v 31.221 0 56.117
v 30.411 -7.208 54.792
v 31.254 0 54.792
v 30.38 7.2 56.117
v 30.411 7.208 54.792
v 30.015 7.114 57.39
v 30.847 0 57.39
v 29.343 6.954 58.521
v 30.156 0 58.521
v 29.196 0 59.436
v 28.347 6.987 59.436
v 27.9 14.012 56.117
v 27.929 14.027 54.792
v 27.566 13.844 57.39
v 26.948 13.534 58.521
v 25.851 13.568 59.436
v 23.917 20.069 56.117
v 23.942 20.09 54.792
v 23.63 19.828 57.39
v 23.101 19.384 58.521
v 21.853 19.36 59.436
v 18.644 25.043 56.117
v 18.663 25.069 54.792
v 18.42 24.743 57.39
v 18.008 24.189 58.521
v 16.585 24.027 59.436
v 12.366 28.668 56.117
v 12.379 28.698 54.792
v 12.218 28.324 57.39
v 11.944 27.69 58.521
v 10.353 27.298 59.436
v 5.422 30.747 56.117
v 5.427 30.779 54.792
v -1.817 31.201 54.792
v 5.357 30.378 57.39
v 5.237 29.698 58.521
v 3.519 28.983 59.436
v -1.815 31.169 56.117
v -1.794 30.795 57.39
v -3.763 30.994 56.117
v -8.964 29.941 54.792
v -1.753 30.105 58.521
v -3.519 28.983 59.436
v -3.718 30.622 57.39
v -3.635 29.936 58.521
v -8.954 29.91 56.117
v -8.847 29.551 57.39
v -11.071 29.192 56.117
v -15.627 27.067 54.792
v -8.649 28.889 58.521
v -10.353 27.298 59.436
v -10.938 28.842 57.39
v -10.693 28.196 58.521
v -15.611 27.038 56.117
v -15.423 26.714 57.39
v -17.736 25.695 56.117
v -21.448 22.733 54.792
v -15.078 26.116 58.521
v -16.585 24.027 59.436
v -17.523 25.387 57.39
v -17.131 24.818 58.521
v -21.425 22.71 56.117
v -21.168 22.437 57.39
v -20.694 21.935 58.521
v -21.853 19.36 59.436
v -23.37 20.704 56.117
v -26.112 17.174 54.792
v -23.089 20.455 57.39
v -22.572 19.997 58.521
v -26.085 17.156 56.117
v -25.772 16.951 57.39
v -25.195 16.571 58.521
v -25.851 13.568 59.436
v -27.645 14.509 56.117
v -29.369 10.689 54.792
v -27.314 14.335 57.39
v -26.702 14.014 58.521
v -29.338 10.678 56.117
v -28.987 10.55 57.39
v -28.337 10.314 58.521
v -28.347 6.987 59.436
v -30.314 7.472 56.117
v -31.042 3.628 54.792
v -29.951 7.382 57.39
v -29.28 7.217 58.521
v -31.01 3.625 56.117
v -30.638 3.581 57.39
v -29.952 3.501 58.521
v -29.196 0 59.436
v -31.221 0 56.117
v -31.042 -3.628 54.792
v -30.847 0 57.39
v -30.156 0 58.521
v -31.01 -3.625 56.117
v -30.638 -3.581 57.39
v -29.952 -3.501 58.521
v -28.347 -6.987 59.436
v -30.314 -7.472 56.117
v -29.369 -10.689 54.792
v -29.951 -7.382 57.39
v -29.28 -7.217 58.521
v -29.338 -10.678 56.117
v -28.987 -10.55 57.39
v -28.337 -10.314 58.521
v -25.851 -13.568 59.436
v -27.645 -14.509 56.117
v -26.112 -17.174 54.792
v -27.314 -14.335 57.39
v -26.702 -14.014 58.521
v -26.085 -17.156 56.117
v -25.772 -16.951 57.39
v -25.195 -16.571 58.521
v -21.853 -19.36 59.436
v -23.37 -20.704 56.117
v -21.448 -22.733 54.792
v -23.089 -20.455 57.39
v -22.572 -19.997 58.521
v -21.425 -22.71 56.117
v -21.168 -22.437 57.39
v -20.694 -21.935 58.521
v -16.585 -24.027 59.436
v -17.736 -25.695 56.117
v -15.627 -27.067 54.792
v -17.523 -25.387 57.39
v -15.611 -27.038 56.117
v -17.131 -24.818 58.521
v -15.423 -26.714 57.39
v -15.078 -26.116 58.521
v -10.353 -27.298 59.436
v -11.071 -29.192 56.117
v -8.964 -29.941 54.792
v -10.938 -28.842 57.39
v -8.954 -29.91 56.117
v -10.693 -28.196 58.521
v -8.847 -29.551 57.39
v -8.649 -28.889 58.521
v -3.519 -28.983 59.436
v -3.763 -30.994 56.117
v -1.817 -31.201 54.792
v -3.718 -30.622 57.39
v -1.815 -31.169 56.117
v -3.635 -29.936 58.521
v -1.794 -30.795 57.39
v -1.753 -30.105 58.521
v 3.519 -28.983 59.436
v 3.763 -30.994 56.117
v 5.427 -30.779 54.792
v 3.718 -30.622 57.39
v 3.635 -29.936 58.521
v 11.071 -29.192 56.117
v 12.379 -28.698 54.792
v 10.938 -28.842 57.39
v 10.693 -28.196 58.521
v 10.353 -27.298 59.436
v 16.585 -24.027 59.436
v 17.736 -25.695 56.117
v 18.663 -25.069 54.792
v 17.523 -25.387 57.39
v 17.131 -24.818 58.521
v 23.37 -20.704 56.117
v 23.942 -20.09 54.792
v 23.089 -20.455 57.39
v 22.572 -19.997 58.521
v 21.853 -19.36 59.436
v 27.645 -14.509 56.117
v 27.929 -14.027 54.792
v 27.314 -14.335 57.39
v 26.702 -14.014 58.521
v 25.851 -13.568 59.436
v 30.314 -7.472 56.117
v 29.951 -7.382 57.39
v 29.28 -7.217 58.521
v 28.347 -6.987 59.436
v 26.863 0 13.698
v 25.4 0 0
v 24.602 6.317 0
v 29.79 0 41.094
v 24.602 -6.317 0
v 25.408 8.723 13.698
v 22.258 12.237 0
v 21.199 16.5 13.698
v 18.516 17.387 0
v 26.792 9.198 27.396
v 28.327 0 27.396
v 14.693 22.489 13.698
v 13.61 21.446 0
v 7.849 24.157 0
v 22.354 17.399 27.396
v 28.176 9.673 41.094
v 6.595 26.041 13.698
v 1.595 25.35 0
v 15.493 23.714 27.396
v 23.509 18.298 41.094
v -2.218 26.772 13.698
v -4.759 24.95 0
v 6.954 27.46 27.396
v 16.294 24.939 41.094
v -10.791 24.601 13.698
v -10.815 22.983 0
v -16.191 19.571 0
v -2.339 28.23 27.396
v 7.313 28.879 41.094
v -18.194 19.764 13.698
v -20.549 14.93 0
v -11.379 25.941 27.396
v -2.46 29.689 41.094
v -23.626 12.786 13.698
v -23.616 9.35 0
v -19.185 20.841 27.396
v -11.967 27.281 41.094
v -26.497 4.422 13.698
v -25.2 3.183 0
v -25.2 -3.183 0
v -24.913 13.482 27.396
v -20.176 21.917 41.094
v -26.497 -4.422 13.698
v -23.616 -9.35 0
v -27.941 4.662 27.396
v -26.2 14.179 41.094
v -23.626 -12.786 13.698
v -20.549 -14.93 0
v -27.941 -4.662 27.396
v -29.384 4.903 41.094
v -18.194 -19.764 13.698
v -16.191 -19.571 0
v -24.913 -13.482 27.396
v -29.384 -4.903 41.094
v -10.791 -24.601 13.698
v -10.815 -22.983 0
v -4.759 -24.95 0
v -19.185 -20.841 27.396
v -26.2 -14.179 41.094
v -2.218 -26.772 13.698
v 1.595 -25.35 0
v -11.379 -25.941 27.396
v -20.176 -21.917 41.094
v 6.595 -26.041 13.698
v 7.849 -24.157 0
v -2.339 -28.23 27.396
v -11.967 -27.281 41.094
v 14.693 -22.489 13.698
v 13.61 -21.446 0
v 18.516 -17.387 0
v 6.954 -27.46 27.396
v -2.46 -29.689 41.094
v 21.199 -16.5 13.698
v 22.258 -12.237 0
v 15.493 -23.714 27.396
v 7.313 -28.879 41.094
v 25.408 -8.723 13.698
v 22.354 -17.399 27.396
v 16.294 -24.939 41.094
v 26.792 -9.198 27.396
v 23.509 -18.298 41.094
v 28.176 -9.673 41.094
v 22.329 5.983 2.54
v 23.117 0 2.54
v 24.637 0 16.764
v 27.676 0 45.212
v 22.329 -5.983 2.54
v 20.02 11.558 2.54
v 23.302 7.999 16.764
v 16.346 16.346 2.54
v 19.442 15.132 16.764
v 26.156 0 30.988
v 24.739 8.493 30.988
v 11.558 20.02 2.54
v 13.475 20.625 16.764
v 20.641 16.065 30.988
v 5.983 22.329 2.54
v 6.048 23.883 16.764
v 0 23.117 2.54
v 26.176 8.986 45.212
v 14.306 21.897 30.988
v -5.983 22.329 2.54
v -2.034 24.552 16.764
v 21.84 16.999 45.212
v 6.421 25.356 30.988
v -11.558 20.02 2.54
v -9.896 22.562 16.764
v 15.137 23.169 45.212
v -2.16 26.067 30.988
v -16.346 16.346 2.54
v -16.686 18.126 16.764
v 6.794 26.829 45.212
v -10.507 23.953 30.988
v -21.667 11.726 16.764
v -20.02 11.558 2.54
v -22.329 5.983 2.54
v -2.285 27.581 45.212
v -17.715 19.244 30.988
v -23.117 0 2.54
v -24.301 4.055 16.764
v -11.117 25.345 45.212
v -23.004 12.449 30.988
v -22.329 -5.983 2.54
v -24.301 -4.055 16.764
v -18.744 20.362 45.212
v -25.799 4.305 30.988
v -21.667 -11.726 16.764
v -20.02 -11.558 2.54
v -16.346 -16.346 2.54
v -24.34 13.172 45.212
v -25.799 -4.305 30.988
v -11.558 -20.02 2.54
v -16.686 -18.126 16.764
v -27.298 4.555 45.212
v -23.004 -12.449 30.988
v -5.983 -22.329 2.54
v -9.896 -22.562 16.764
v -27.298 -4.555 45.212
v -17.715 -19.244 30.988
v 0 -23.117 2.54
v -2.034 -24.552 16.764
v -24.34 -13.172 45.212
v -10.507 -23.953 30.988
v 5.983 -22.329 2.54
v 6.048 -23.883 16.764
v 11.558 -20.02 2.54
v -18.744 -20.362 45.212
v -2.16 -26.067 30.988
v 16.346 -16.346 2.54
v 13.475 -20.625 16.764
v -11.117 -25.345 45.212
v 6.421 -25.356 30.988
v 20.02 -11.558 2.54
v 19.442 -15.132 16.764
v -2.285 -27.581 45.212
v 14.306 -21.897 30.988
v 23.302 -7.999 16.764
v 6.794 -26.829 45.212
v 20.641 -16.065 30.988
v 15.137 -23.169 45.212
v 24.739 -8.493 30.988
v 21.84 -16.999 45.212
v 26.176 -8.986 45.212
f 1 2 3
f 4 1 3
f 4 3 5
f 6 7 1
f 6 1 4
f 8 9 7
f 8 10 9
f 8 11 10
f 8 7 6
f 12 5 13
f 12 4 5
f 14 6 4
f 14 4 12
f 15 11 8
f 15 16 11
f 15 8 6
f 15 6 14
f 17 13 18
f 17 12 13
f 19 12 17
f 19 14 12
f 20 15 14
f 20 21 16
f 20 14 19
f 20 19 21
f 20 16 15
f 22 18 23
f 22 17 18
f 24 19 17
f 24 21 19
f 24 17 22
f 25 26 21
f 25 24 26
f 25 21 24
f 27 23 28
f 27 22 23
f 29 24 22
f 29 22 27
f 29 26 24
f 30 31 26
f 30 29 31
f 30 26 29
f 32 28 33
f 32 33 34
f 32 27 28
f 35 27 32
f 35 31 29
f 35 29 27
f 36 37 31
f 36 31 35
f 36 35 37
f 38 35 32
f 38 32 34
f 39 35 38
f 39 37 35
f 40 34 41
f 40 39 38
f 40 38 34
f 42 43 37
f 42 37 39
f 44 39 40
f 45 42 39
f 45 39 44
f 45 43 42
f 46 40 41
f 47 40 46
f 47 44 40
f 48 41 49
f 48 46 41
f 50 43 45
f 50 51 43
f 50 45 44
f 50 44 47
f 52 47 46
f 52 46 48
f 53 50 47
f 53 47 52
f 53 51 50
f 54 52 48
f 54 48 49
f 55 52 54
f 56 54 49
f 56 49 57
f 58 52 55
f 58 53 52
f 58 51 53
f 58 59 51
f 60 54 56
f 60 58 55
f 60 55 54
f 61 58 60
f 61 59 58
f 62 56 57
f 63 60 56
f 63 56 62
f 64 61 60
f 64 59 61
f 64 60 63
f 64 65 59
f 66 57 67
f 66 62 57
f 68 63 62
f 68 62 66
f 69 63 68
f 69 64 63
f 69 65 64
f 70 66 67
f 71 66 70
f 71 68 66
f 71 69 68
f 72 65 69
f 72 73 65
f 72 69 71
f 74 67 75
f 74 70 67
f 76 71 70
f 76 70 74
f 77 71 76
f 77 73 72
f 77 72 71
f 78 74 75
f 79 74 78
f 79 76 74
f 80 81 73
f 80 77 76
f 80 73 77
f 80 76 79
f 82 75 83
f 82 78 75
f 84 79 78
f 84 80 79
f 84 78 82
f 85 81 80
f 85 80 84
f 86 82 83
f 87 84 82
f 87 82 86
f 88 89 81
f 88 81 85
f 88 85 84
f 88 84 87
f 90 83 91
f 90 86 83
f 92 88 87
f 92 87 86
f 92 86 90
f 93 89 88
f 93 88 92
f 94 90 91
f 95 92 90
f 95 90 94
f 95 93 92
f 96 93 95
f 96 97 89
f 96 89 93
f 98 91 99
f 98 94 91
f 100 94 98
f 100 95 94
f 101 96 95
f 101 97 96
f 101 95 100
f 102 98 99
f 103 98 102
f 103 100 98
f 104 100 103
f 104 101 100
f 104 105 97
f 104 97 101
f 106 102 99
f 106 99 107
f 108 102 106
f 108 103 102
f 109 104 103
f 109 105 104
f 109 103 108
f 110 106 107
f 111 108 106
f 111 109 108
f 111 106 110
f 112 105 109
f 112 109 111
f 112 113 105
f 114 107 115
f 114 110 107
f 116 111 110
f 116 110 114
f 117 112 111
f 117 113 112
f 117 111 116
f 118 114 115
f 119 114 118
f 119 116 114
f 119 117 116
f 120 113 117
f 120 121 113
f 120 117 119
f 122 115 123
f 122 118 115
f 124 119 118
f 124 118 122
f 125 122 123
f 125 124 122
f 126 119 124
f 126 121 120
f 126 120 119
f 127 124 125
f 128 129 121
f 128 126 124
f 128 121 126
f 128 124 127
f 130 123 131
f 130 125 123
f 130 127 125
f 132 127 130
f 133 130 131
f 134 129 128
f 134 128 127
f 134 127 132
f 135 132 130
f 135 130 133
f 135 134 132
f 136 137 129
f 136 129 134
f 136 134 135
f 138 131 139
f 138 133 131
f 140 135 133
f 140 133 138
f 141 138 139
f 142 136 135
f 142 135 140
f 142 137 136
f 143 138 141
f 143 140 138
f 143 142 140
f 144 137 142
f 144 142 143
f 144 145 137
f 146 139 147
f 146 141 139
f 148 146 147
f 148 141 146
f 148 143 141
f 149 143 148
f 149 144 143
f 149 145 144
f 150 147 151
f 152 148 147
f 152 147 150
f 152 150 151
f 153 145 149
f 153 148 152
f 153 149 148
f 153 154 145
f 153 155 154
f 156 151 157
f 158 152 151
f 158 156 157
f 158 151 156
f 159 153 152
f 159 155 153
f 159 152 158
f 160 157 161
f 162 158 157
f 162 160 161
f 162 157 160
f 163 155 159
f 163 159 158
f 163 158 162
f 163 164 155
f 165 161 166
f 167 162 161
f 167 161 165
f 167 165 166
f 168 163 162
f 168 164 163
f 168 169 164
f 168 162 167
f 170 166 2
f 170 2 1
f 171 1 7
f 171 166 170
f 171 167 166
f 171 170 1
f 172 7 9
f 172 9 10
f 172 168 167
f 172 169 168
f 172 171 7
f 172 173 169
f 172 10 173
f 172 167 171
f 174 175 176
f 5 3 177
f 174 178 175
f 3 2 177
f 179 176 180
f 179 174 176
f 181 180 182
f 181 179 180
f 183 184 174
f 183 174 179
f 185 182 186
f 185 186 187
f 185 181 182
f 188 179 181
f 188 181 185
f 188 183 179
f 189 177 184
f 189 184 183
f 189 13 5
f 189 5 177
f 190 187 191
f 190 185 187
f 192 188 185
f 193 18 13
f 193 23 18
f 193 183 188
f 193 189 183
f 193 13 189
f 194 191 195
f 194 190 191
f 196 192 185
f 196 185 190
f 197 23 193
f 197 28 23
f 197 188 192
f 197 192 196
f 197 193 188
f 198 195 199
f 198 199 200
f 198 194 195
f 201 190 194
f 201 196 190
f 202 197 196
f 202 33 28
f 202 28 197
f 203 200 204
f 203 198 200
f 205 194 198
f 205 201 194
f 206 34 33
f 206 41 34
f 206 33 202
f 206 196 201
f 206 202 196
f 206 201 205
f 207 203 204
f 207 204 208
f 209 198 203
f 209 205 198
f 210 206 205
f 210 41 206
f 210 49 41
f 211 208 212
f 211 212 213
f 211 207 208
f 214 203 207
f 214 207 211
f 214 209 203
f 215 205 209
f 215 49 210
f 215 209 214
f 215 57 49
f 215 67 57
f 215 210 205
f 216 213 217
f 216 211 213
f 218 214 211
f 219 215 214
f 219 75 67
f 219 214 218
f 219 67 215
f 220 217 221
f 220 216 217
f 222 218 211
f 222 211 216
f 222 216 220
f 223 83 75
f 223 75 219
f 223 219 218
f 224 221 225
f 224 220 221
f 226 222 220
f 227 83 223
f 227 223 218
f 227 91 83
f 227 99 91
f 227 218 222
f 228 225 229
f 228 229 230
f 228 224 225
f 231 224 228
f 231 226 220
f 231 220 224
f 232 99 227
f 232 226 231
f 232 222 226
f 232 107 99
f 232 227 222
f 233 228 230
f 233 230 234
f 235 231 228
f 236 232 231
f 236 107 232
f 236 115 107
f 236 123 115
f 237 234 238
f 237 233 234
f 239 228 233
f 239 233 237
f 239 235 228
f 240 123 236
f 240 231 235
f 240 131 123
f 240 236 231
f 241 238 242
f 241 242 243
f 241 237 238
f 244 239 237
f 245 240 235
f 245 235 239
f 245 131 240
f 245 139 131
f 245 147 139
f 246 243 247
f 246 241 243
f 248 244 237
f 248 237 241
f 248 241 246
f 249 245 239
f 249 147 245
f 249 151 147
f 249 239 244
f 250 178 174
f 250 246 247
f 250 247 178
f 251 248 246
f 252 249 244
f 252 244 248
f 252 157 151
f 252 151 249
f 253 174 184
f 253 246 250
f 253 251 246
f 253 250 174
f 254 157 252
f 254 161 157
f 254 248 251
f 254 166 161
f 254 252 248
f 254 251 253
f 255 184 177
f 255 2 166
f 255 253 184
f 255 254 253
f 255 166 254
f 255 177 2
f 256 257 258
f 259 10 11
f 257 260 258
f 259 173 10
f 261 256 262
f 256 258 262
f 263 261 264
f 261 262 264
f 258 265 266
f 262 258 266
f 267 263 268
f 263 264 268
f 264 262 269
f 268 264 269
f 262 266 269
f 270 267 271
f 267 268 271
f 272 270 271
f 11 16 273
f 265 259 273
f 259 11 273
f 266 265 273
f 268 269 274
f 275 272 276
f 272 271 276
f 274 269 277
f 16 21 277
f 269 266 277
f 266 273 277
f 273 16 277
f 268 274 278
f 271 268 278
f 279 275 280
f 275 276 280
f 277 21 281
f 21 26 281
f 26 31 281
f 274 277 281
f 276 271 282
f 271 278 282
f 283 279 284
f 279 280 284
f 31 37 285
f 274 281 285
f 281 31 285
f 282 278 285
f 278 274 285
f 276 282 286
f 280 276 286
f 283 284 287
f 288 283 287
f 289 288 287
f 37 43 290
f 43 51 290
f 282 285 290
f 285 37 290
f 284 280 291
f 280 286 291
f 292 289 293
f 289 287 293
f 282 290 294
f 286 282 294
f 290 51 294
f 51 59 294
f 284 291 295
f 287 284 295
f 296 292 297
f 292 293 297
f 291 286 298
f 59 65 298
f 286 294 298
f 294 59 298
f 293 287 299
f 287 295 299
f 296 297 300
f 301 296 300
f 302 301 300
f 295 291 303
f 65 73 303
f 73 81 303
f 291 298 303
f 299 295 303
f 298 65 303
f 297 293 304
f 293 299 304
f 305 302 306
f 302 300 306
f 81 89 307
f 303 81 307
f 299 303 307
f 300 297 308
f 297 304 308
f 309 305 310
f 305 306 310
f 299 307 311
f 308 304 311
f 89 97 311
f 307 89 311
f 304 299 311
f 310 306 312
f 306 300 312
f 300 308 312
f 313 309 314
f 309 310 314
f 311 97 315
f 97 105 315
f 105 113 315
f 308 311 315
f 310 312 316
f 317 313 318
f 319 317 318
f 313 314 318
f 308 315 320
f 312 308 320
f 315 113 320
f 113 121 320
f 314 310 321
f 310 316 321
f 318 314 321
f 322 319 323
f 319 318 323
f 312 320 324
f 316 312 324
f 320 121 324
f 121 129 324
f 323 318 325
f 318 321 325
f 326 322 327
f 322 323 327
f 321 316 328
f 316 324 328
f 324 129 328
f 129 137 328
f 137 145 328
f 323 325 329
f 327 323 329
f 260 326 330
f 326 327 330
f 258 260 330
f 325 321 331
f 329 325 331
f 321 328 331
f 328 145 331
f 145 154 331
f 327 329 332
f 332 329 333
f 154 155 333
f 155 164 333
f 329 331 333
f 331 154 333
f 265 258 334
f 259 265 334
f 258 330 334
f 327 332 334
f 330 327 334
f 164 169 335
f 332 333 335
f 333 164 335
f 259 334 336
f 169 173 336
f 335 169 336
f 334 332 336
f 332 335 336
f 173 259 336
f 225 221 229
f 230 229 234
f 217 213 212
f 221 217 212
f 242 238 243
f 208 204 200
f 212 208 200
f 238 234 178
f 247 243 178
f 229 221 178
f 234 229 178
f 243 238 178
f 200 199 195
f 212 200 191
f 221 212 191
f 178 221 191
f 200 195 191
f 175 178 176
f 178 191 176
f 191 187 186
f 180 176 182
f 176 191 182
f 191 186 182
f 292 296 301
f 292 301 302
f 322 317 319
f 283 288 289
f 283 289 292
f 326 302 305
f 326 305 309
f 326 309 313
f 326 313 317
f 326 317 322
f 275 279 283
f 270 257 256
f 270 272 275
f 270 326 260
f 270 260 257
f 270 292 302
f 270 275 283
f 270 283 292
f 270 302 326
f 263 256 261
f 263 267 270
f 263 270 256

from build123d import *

# Parameters (mm, degrees)
F0_R = 25.4
F2_R = 31.75
F4_T = -2.54


# Not quite as in the source:
# - a fillet or chamfer that OpenCascade refuses, or shapes differently, is made with other operations: its cross-section is extruded or revolved along the edge and cut away or added


with BuildPart() as f3:
    # F0 (on Top) → F3 section 0
    with BuildSketch(Plane.XY):
        Circle(F0_R)
    # F2 (on offset) → F3 section 1
    with BuildSketch(Plane.XY.offset(59.436)):
        Circle(F2_R)
    loft()

    # F4
    f4_openings = [f3.faces().sort_by_distance(p)[0] for p in [
        (0, 0, 59.436),
    ]]
    offset(amount=F4_T, openings=f4_openings, kind=Kind.INTERSECTION)

    # F5: fillet of radius 5.08 on 1 edges, made by hand

    # F5_s1 → F5_t2 (revolve, cut)
    with BuildSketch(Plane.XZ):
        with BuildLine():
            ThreePointArc((31.2538092028, 54.7916541382), (30.8469014644, 57.3895821842), (29.195545003, 59.436))
            Line((29.195545003, 59.436), (31.75, 59.436))
            Line((31.75, 59.436), (31.2538092028, 54.7916541382))
        make_face()
    revolve(axis=Axis((0, 0, 59.436), (0, 0, 1)), mode=Mode.SUBTRACT)


solid = f3.part
